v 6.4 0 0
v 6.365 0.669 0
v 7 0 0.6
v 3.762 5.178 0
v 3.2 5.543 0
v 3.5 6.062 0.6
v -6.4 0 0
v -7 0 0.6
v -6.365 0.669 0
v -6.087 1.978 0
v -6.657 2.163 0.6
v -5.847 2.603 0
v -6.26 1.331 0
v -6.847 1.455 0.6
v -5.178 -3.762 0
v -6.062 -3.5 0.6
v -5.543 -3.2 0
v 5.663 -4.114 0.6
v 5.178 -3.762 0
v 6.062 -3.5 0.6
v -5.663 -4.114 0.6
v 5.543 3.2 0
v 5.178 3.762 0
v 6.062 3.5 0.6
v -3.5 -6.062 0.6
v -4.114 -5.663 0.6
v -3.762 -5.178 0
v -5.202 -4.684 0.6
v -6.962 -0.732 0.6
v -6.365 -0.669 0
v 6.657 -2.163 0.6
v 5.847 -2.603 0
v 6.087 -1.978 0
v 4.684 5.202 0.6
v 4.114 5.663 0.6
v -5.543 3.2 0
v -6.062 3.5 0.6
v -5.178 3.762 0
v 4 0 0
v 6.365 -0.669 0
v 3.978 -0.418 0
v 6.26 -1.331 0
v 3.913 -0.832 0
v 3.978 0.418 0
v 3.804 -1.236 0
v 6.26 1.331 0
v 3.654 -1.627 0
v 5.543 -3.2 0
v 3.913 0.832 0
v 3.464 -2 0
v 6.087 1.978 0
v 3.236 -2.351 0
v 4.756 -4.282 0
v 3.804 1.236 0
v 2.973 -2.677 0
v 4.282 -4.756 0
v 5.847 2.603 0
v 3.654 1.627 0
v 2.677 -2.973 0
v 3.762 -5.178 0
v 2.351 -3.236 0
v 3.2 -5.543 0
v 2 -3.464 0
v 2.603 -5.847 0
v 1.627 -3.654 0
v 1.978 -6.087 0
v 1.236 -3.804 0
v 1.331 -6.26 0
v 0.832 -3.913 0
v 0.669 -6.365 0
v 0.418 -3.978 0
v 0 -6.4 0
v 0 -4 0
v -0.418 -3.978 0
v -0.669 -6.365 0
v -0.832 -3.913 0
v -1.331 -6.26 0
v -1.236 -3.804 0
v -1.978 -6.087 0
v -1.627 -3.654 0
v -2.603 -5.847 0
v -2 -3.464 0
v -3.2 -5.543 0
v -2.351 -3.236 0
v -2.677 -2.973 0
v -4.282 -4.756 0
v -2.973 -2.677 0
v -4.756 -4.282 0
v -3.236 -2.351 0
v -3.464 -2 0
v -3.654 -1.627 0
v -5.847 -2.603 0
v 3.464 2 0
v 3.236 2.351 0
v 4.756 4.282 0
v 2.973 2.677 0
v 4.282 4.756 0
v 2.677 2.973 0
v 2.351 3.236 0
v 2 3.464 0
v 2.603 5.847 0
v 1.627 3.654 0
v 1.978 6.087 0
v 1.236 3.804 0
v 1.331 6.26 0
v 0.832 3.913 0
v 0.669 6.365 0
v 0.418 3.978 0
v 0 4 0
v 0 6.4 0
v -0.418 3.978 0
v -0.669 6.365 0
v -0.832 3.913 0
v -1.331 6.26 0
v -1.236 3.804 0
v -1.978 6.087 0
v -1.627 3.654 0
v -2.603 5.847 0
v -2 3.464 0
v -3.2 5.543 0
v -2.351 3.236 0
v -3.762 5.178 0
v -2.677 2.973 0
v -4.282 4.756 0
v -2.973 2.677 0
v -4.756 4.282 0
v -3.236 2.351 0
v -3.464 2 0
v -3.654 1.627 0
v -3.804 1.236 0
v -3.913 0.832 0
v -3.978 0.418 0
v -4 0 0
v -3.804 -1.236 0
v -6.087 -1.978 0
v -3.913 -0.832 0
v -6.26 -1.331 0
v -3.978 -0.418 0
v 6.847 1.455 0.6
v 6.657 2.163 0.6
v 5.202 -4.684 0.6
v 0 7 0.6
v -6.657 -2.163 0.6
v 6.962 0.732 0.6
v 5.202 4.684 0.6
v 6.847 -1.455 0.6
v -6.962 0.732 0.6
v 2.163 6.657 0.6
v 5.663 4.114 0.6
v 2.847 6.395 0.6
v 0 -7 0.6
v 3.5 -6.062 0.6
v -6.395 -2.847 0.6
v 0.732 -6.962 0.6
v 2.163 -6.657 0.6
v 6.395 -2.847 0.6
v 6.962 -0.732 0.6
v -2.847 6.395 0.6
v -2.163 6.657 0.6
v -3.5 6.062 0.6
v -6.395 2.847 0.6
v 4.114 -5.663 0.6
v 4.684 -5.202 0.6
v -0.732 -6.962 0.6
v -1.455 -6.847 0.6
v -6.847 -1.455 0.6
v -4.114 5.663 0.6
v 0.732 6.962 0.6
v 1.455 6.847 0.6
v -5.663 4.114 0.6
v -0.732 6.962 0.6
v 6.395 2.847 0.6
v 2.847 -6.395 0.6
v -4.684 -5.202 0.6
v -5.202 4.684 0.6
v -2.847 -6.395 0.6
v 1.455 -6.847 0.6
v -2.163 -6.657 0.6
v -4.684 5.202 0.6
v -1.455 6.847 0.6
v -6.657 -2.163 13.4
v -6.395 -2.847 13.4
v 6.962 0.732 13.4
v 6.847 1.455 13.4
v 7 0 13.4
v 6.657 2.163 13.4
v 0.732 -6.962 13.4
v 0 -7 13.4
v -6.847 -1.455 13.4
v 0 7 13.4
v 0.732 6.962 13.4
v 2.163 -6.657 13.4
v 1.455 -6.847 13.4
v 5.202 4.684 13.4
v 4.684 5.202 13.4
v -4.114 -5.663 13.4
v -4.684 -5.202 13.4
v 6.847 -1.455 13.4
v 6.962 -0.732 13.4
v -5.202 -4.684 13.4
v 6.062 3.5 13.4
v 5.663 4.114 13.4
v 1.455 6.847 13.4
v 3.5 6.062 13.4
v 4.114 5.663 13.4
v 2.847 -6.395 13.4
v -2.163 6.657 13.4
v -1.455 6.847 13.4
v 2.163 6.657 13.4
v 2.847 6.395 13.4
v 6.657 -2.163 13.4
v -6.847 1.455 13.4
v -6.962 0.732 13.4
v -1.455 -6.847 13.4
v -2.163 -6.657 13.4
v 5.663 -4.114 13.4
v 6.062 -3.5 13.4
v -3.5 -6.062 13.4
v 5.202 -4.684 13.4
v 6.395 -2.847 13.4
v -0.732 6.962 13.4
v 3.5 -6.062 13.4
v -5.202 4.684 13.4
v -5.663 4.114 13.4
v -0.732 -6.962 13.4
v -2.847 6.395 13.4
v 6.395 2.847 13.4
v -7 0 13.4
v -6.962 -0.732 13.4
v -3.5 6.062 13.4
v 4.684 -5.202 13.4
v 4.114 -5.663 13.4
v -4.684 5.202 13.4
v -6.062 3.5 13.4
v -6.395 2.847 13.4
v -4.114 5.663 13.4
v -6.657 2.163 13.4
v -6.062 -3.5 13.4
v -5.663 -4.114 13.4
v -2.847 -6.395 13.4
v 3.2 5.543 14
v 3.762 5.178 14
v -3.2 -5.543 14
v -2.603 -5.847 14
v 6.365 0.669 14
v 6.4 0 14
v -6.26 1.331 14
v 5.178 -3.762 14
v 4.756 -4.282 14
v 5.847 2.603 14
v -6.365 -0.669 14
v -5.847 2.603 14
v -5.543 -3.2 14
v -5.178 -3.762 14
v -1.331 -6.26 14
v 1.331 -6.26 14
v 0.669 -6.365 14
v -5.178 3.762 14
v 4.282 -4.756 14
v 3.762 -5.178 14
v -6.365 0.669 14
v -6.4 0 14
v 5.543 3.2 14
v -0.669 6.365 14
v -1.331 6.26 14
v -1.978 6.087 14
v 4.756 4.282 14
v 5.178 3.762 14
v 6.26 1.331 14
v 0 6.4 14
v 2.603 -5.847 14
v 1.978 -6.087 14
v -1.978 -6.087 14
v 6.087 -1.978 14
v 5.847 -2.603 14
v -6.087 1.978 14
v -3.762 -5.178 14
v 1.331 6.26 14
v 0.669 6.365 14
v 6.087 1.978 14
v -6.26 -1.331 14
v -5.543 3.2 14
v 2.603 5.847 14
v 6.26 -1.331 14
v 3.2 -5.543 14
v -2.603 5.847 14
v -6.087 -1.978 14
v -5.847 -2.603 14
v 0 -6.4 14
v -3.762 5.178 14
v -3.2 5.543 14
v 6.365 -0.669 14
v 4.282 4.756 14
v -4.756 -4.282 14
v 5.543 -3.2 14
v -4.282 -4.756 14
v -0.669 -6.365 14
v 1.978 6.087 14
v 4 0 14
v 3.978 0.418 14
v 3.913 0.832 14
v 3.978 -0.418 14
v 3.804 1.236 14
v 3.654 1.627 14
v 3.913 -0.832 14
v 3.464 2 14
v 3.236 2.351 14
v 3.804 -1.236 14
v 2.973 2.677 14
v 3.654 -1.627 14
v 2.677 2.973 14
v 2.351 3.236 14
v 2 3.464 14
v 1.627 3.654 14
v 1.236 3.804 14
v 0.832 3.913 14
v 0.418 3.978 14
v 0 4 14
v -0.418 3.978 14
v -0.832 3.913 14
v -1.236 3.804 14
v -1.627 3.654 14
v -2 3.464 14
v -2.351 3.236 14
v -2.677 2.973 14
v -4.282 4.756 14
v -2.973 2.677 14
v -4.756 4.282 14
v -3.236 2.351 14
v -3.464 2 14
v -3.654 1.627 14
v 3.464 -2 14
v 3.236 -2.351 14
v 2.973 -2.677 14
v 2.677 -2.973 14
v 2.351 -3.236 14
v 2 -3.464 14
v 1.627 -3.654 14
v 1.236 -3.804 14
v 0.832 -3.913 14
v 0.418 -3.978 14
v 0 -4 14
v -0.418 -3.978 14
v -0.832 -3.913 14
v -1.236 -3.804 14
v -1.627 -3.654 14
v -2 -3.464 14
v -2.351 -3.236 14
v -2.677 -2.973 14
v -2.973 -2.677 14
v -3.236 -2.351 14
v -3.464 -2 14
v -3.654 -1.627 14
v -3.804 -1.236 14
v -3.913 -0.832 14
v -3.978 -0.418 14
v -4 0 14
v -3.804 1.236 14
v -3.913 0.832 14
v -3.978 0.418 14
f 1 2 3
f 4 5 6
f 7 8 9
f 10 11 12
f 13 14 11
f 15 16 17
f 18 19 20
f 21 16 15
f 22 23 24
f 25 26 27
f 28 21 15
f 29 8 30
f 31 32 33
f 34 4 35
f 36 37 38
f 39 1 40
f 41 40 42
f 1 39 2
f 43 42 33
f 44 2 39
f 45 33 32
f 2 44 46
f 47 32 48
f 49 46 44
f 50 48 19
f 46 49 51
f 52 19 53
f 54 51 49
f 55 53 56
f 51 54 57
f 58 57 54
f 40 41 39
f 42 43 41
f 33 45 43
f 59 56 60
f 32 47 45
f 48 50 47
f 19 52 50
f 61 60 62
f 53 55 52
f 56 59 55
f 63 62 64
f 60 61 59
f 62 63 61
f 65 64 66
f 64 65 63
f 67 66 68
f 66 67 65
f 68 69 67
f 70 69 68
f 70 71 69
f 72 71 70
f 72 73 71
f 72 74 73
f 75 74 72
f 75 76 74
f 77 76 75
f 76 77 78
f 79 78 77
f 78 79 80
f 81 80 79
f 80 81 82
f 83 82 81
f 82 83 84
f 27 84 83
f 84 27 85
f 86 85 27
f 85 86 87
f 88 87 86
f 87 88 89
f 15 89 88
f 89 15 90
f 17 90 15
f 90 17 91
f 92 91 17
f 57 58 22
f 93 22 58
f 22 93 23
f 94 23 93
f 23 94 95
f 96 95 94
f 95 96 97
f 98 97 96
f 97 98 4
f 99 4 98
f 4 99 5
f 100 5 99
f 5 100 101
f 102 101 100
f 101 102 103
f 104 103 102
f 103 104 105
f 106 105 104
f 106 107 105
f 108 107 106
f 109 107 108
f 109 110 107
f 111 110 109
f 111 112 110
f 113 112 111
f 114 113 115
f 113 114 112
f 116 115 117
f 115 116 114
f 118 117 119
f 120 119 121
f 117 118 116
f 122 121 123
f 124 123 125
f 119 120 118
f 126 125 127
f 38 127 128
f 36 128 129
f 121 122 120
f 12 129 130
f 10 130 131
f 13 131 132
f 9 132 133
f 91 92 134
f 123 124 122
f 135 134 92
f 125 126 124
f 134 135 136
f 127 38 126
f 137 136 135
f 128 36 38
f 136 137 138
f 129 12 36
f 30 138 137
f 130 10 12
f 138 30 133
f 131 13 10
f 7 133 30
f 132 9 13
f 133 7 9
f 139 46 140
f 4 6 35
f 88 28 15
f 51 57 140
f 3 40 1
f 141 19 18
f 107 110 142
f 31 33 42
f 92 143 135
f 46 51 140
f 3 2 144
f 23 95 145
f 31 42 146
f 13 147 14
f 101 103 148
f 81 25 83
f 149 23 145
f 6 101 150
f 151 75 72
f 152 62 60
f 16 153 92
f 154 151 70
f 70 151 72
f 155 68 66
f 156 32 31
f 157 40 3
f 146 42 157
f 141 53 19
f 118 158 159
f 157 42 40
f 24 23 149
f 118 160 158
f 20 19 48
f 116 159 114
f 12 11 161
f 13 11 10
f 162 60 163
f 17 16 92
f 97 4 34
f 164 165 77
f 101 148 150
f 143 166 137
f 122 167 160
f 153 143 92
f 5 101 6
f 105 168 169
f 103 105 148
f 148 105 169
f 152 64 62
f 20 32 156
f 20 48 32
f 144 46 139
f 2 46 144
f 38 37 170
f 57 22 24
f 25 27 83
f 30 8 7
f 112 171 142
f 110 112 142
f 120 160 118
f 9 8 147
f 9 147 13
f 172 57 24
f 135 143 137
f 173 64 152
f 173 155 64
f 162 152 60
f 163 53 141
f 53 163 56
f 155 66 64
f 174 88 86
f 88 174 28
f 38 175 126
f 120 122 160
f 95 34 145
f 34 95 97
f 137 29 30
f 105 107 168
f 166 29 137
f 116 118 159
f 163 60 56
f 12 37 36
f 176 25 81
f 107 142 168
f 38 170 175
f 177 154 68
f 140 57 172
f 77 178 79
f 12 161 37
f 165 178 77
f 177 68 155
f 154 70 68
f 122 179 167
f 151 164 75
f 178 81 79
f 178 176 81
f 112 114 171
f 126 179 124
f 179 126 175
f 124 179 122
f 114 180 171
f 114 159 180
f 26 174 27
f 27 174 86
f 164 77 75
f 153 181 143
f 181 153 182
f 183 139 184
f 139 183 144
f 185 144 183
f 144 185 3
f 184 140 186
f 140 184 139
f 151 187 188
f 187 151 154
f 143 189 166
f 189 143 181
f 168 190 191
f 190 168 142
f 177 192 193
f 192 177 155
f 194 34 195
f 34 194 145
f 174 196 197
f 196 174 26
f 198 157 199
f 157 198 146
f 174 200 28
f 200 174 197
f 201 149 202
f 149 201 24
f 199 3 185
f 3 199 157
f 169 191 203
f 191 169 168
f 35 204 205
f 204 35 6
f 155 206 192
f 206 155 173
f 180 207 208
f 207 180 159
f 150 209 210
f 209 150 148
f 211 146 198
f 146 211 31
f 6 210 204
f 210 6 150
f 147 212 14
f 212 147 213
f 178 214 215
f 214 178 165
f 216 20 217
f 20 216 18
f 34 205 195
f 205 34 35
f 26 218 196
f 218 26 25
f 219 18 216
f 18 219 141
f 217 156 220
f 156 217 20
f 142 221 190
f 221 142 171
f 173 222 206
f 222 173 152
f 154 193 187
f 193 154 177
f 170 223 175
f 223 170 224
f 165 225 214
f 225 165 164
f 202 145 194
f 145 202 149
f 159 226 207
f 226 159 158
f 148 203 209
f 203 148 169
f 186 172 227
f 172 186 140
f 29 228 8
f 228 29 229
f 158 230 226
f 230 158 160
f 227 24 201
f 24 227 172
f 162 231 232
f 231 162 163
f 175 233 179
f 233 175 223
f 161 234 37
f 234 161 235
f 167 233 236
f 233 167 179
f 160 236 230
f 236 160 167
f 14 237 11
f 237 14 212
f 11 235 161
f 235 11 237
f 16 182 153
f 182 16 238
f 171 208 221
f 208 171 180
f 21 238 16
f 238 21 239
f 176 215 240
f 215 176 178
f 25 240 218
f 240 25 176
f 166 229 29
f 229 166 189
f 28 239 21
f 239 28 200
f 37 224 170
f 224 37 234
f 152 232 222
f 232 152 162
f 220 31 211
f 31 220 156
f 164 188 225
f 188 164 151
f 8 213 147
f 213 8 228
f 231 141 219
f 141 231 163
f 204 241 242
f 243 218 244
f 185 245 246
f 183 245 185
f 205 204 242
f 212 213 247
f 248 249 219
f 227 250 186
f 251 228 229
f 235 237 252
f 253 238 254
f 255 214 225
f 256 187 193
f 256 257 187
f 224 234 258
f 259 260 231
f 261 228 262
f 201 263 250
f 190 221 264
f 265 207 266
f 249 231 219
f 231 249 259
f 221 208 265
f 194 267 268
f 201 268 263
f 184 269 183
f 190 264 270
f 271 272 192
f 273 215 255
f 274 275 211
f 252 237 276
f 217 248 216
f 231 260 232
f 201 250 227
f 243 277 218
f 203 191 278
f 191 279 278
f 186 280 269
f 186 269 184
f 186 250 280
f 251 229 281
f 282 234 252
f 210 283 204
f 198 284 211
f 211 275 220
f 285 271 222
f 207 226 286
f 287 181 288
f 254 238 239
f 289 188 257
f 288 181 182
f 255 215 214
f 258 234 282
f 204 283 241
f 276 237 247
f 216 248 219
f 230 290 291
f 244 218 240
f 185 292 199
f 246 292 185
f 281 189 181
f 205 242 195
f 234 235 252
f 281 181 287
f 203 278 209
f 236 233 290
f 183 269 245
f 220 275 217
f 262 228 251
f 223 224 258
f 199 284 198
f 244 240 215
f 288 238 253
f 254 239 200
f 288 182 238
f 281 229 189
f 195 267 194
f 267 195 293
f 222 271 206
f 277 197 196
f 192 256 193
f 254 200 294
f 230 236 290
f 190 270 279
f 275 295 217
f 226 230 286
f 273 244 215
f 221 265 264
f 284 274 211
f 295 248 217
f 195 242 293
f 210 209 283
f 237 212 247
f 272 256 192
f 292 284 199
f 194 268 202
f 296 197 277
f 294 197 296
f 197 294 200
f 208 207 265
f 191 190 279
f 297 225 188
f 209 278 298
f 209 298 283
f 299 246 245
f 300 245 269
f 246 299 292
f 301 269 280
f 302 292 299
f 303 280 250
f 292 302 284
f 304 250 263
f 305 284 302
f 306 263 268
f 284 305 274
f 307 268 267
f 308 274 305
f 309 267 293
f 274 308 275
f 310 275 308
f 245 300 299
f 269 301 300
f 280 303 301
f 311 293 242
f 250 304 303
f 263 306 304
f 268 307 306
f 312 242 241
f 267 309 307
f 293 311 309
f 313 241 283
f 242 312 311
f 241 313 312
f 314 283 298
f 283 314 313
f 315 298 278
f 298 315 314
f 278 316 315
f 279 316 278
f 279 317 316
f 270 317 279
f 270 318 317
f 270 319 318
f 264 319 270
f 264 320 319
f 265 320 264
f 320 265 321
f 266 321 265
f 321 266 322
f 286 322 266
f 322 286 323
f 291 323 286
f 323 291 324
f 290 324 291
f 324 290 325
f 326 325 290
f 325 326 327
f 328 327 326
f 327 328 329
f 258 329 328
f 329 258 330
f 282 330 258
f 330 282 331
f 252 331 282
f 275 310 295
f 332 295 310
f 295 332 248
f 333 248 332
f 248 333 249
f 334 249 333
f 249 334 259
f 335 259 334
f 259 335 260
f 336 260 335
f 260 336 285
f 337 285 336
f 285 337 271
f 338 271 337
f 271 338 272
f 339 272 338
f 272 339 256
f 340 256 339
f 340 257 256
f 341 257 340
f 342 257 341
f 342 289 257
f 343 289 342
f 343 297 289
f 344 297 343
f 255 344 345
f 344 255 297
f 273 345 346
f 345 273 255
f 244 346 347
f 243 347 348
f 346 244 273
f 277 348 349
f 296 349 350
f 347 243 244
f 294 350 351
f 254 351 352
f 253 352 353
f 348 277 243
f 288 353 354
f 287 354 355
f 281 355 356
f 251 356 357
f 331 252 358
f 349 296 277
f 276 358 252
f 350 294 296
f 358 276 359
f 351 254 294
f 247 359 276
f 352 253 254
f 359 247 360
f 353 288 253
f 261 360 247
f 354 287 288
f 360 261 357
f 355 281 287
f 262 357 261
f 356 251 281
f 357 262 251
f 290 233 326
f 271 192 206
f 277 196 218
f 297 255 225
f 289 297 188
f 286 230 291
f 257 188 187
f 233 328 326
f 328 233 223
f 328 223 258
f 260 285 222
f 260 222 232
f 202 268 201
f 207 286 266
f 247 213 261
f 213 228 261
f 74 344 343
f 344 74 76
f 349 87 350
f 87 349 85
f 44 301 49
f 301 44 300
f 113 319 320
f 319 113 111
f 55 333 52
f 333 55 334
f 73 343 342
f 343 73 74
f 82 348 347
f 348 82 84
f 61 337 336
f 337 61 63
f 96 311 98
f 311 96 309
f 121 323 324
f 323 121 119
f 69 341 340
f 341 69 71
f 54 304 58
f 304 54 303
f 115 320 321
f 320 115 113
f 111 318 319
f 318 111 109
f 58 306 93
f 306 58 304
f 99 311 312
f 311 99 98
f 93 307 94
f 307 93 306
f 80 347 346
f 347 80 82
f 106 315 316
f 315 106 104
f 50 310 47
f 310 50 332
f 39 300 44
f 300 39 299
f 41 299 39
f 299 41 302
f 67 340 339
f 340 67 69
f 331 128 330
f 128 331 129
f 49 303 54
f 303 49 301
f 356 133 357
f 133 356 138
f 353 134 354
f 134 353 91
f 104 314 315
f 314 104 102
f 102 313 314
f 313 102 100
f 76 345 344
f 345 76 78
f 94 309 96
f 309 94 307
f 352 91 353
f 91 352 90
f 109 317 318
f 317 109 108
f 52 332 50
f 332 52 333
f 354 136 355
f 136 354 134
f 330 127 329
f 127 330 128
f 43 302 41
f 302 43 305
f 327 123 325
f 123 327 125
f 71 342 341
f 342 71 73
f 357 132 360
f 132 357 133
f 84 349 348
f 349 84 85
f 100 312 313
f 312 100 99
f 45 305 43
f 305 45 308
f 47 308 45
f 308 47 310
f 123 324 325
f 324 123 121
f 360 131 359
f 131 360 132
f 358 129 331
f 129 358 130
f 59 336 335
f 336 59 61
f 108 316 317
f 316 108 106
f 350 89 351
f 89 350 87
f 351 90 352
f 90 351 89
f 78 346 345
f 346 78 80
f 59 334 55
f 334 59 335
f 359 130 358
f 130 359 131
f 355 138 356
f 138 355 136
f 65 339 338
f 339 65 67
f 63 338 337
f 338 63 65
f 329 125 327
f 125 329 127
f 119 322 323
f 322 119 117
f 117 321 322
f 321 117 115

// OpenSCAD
// Plain sleeve bushing.
$fn = 60;
eps = 0.02;
inner_d = 8;
outer_d = 14;
length = 14;
chamfer = 0.6;
difference() {
    union() {
        cylinder(d1 = outer_d - 2 * chamfer, d2 = outer_d, h = chamfer);
        translate([0, 0, chamfer]) cylinder(d = outer_d, h = length - 2 * chamfer);
        translate([0, 0, length - chamfer]) cylinder(d1 = outer_d, d2 = outer_d - 2 * chamfer, h = chamfer);
    }
    translate([0, 0, -eps]) cylinder(d = inner_d, h = length + 2 * eps);
}
